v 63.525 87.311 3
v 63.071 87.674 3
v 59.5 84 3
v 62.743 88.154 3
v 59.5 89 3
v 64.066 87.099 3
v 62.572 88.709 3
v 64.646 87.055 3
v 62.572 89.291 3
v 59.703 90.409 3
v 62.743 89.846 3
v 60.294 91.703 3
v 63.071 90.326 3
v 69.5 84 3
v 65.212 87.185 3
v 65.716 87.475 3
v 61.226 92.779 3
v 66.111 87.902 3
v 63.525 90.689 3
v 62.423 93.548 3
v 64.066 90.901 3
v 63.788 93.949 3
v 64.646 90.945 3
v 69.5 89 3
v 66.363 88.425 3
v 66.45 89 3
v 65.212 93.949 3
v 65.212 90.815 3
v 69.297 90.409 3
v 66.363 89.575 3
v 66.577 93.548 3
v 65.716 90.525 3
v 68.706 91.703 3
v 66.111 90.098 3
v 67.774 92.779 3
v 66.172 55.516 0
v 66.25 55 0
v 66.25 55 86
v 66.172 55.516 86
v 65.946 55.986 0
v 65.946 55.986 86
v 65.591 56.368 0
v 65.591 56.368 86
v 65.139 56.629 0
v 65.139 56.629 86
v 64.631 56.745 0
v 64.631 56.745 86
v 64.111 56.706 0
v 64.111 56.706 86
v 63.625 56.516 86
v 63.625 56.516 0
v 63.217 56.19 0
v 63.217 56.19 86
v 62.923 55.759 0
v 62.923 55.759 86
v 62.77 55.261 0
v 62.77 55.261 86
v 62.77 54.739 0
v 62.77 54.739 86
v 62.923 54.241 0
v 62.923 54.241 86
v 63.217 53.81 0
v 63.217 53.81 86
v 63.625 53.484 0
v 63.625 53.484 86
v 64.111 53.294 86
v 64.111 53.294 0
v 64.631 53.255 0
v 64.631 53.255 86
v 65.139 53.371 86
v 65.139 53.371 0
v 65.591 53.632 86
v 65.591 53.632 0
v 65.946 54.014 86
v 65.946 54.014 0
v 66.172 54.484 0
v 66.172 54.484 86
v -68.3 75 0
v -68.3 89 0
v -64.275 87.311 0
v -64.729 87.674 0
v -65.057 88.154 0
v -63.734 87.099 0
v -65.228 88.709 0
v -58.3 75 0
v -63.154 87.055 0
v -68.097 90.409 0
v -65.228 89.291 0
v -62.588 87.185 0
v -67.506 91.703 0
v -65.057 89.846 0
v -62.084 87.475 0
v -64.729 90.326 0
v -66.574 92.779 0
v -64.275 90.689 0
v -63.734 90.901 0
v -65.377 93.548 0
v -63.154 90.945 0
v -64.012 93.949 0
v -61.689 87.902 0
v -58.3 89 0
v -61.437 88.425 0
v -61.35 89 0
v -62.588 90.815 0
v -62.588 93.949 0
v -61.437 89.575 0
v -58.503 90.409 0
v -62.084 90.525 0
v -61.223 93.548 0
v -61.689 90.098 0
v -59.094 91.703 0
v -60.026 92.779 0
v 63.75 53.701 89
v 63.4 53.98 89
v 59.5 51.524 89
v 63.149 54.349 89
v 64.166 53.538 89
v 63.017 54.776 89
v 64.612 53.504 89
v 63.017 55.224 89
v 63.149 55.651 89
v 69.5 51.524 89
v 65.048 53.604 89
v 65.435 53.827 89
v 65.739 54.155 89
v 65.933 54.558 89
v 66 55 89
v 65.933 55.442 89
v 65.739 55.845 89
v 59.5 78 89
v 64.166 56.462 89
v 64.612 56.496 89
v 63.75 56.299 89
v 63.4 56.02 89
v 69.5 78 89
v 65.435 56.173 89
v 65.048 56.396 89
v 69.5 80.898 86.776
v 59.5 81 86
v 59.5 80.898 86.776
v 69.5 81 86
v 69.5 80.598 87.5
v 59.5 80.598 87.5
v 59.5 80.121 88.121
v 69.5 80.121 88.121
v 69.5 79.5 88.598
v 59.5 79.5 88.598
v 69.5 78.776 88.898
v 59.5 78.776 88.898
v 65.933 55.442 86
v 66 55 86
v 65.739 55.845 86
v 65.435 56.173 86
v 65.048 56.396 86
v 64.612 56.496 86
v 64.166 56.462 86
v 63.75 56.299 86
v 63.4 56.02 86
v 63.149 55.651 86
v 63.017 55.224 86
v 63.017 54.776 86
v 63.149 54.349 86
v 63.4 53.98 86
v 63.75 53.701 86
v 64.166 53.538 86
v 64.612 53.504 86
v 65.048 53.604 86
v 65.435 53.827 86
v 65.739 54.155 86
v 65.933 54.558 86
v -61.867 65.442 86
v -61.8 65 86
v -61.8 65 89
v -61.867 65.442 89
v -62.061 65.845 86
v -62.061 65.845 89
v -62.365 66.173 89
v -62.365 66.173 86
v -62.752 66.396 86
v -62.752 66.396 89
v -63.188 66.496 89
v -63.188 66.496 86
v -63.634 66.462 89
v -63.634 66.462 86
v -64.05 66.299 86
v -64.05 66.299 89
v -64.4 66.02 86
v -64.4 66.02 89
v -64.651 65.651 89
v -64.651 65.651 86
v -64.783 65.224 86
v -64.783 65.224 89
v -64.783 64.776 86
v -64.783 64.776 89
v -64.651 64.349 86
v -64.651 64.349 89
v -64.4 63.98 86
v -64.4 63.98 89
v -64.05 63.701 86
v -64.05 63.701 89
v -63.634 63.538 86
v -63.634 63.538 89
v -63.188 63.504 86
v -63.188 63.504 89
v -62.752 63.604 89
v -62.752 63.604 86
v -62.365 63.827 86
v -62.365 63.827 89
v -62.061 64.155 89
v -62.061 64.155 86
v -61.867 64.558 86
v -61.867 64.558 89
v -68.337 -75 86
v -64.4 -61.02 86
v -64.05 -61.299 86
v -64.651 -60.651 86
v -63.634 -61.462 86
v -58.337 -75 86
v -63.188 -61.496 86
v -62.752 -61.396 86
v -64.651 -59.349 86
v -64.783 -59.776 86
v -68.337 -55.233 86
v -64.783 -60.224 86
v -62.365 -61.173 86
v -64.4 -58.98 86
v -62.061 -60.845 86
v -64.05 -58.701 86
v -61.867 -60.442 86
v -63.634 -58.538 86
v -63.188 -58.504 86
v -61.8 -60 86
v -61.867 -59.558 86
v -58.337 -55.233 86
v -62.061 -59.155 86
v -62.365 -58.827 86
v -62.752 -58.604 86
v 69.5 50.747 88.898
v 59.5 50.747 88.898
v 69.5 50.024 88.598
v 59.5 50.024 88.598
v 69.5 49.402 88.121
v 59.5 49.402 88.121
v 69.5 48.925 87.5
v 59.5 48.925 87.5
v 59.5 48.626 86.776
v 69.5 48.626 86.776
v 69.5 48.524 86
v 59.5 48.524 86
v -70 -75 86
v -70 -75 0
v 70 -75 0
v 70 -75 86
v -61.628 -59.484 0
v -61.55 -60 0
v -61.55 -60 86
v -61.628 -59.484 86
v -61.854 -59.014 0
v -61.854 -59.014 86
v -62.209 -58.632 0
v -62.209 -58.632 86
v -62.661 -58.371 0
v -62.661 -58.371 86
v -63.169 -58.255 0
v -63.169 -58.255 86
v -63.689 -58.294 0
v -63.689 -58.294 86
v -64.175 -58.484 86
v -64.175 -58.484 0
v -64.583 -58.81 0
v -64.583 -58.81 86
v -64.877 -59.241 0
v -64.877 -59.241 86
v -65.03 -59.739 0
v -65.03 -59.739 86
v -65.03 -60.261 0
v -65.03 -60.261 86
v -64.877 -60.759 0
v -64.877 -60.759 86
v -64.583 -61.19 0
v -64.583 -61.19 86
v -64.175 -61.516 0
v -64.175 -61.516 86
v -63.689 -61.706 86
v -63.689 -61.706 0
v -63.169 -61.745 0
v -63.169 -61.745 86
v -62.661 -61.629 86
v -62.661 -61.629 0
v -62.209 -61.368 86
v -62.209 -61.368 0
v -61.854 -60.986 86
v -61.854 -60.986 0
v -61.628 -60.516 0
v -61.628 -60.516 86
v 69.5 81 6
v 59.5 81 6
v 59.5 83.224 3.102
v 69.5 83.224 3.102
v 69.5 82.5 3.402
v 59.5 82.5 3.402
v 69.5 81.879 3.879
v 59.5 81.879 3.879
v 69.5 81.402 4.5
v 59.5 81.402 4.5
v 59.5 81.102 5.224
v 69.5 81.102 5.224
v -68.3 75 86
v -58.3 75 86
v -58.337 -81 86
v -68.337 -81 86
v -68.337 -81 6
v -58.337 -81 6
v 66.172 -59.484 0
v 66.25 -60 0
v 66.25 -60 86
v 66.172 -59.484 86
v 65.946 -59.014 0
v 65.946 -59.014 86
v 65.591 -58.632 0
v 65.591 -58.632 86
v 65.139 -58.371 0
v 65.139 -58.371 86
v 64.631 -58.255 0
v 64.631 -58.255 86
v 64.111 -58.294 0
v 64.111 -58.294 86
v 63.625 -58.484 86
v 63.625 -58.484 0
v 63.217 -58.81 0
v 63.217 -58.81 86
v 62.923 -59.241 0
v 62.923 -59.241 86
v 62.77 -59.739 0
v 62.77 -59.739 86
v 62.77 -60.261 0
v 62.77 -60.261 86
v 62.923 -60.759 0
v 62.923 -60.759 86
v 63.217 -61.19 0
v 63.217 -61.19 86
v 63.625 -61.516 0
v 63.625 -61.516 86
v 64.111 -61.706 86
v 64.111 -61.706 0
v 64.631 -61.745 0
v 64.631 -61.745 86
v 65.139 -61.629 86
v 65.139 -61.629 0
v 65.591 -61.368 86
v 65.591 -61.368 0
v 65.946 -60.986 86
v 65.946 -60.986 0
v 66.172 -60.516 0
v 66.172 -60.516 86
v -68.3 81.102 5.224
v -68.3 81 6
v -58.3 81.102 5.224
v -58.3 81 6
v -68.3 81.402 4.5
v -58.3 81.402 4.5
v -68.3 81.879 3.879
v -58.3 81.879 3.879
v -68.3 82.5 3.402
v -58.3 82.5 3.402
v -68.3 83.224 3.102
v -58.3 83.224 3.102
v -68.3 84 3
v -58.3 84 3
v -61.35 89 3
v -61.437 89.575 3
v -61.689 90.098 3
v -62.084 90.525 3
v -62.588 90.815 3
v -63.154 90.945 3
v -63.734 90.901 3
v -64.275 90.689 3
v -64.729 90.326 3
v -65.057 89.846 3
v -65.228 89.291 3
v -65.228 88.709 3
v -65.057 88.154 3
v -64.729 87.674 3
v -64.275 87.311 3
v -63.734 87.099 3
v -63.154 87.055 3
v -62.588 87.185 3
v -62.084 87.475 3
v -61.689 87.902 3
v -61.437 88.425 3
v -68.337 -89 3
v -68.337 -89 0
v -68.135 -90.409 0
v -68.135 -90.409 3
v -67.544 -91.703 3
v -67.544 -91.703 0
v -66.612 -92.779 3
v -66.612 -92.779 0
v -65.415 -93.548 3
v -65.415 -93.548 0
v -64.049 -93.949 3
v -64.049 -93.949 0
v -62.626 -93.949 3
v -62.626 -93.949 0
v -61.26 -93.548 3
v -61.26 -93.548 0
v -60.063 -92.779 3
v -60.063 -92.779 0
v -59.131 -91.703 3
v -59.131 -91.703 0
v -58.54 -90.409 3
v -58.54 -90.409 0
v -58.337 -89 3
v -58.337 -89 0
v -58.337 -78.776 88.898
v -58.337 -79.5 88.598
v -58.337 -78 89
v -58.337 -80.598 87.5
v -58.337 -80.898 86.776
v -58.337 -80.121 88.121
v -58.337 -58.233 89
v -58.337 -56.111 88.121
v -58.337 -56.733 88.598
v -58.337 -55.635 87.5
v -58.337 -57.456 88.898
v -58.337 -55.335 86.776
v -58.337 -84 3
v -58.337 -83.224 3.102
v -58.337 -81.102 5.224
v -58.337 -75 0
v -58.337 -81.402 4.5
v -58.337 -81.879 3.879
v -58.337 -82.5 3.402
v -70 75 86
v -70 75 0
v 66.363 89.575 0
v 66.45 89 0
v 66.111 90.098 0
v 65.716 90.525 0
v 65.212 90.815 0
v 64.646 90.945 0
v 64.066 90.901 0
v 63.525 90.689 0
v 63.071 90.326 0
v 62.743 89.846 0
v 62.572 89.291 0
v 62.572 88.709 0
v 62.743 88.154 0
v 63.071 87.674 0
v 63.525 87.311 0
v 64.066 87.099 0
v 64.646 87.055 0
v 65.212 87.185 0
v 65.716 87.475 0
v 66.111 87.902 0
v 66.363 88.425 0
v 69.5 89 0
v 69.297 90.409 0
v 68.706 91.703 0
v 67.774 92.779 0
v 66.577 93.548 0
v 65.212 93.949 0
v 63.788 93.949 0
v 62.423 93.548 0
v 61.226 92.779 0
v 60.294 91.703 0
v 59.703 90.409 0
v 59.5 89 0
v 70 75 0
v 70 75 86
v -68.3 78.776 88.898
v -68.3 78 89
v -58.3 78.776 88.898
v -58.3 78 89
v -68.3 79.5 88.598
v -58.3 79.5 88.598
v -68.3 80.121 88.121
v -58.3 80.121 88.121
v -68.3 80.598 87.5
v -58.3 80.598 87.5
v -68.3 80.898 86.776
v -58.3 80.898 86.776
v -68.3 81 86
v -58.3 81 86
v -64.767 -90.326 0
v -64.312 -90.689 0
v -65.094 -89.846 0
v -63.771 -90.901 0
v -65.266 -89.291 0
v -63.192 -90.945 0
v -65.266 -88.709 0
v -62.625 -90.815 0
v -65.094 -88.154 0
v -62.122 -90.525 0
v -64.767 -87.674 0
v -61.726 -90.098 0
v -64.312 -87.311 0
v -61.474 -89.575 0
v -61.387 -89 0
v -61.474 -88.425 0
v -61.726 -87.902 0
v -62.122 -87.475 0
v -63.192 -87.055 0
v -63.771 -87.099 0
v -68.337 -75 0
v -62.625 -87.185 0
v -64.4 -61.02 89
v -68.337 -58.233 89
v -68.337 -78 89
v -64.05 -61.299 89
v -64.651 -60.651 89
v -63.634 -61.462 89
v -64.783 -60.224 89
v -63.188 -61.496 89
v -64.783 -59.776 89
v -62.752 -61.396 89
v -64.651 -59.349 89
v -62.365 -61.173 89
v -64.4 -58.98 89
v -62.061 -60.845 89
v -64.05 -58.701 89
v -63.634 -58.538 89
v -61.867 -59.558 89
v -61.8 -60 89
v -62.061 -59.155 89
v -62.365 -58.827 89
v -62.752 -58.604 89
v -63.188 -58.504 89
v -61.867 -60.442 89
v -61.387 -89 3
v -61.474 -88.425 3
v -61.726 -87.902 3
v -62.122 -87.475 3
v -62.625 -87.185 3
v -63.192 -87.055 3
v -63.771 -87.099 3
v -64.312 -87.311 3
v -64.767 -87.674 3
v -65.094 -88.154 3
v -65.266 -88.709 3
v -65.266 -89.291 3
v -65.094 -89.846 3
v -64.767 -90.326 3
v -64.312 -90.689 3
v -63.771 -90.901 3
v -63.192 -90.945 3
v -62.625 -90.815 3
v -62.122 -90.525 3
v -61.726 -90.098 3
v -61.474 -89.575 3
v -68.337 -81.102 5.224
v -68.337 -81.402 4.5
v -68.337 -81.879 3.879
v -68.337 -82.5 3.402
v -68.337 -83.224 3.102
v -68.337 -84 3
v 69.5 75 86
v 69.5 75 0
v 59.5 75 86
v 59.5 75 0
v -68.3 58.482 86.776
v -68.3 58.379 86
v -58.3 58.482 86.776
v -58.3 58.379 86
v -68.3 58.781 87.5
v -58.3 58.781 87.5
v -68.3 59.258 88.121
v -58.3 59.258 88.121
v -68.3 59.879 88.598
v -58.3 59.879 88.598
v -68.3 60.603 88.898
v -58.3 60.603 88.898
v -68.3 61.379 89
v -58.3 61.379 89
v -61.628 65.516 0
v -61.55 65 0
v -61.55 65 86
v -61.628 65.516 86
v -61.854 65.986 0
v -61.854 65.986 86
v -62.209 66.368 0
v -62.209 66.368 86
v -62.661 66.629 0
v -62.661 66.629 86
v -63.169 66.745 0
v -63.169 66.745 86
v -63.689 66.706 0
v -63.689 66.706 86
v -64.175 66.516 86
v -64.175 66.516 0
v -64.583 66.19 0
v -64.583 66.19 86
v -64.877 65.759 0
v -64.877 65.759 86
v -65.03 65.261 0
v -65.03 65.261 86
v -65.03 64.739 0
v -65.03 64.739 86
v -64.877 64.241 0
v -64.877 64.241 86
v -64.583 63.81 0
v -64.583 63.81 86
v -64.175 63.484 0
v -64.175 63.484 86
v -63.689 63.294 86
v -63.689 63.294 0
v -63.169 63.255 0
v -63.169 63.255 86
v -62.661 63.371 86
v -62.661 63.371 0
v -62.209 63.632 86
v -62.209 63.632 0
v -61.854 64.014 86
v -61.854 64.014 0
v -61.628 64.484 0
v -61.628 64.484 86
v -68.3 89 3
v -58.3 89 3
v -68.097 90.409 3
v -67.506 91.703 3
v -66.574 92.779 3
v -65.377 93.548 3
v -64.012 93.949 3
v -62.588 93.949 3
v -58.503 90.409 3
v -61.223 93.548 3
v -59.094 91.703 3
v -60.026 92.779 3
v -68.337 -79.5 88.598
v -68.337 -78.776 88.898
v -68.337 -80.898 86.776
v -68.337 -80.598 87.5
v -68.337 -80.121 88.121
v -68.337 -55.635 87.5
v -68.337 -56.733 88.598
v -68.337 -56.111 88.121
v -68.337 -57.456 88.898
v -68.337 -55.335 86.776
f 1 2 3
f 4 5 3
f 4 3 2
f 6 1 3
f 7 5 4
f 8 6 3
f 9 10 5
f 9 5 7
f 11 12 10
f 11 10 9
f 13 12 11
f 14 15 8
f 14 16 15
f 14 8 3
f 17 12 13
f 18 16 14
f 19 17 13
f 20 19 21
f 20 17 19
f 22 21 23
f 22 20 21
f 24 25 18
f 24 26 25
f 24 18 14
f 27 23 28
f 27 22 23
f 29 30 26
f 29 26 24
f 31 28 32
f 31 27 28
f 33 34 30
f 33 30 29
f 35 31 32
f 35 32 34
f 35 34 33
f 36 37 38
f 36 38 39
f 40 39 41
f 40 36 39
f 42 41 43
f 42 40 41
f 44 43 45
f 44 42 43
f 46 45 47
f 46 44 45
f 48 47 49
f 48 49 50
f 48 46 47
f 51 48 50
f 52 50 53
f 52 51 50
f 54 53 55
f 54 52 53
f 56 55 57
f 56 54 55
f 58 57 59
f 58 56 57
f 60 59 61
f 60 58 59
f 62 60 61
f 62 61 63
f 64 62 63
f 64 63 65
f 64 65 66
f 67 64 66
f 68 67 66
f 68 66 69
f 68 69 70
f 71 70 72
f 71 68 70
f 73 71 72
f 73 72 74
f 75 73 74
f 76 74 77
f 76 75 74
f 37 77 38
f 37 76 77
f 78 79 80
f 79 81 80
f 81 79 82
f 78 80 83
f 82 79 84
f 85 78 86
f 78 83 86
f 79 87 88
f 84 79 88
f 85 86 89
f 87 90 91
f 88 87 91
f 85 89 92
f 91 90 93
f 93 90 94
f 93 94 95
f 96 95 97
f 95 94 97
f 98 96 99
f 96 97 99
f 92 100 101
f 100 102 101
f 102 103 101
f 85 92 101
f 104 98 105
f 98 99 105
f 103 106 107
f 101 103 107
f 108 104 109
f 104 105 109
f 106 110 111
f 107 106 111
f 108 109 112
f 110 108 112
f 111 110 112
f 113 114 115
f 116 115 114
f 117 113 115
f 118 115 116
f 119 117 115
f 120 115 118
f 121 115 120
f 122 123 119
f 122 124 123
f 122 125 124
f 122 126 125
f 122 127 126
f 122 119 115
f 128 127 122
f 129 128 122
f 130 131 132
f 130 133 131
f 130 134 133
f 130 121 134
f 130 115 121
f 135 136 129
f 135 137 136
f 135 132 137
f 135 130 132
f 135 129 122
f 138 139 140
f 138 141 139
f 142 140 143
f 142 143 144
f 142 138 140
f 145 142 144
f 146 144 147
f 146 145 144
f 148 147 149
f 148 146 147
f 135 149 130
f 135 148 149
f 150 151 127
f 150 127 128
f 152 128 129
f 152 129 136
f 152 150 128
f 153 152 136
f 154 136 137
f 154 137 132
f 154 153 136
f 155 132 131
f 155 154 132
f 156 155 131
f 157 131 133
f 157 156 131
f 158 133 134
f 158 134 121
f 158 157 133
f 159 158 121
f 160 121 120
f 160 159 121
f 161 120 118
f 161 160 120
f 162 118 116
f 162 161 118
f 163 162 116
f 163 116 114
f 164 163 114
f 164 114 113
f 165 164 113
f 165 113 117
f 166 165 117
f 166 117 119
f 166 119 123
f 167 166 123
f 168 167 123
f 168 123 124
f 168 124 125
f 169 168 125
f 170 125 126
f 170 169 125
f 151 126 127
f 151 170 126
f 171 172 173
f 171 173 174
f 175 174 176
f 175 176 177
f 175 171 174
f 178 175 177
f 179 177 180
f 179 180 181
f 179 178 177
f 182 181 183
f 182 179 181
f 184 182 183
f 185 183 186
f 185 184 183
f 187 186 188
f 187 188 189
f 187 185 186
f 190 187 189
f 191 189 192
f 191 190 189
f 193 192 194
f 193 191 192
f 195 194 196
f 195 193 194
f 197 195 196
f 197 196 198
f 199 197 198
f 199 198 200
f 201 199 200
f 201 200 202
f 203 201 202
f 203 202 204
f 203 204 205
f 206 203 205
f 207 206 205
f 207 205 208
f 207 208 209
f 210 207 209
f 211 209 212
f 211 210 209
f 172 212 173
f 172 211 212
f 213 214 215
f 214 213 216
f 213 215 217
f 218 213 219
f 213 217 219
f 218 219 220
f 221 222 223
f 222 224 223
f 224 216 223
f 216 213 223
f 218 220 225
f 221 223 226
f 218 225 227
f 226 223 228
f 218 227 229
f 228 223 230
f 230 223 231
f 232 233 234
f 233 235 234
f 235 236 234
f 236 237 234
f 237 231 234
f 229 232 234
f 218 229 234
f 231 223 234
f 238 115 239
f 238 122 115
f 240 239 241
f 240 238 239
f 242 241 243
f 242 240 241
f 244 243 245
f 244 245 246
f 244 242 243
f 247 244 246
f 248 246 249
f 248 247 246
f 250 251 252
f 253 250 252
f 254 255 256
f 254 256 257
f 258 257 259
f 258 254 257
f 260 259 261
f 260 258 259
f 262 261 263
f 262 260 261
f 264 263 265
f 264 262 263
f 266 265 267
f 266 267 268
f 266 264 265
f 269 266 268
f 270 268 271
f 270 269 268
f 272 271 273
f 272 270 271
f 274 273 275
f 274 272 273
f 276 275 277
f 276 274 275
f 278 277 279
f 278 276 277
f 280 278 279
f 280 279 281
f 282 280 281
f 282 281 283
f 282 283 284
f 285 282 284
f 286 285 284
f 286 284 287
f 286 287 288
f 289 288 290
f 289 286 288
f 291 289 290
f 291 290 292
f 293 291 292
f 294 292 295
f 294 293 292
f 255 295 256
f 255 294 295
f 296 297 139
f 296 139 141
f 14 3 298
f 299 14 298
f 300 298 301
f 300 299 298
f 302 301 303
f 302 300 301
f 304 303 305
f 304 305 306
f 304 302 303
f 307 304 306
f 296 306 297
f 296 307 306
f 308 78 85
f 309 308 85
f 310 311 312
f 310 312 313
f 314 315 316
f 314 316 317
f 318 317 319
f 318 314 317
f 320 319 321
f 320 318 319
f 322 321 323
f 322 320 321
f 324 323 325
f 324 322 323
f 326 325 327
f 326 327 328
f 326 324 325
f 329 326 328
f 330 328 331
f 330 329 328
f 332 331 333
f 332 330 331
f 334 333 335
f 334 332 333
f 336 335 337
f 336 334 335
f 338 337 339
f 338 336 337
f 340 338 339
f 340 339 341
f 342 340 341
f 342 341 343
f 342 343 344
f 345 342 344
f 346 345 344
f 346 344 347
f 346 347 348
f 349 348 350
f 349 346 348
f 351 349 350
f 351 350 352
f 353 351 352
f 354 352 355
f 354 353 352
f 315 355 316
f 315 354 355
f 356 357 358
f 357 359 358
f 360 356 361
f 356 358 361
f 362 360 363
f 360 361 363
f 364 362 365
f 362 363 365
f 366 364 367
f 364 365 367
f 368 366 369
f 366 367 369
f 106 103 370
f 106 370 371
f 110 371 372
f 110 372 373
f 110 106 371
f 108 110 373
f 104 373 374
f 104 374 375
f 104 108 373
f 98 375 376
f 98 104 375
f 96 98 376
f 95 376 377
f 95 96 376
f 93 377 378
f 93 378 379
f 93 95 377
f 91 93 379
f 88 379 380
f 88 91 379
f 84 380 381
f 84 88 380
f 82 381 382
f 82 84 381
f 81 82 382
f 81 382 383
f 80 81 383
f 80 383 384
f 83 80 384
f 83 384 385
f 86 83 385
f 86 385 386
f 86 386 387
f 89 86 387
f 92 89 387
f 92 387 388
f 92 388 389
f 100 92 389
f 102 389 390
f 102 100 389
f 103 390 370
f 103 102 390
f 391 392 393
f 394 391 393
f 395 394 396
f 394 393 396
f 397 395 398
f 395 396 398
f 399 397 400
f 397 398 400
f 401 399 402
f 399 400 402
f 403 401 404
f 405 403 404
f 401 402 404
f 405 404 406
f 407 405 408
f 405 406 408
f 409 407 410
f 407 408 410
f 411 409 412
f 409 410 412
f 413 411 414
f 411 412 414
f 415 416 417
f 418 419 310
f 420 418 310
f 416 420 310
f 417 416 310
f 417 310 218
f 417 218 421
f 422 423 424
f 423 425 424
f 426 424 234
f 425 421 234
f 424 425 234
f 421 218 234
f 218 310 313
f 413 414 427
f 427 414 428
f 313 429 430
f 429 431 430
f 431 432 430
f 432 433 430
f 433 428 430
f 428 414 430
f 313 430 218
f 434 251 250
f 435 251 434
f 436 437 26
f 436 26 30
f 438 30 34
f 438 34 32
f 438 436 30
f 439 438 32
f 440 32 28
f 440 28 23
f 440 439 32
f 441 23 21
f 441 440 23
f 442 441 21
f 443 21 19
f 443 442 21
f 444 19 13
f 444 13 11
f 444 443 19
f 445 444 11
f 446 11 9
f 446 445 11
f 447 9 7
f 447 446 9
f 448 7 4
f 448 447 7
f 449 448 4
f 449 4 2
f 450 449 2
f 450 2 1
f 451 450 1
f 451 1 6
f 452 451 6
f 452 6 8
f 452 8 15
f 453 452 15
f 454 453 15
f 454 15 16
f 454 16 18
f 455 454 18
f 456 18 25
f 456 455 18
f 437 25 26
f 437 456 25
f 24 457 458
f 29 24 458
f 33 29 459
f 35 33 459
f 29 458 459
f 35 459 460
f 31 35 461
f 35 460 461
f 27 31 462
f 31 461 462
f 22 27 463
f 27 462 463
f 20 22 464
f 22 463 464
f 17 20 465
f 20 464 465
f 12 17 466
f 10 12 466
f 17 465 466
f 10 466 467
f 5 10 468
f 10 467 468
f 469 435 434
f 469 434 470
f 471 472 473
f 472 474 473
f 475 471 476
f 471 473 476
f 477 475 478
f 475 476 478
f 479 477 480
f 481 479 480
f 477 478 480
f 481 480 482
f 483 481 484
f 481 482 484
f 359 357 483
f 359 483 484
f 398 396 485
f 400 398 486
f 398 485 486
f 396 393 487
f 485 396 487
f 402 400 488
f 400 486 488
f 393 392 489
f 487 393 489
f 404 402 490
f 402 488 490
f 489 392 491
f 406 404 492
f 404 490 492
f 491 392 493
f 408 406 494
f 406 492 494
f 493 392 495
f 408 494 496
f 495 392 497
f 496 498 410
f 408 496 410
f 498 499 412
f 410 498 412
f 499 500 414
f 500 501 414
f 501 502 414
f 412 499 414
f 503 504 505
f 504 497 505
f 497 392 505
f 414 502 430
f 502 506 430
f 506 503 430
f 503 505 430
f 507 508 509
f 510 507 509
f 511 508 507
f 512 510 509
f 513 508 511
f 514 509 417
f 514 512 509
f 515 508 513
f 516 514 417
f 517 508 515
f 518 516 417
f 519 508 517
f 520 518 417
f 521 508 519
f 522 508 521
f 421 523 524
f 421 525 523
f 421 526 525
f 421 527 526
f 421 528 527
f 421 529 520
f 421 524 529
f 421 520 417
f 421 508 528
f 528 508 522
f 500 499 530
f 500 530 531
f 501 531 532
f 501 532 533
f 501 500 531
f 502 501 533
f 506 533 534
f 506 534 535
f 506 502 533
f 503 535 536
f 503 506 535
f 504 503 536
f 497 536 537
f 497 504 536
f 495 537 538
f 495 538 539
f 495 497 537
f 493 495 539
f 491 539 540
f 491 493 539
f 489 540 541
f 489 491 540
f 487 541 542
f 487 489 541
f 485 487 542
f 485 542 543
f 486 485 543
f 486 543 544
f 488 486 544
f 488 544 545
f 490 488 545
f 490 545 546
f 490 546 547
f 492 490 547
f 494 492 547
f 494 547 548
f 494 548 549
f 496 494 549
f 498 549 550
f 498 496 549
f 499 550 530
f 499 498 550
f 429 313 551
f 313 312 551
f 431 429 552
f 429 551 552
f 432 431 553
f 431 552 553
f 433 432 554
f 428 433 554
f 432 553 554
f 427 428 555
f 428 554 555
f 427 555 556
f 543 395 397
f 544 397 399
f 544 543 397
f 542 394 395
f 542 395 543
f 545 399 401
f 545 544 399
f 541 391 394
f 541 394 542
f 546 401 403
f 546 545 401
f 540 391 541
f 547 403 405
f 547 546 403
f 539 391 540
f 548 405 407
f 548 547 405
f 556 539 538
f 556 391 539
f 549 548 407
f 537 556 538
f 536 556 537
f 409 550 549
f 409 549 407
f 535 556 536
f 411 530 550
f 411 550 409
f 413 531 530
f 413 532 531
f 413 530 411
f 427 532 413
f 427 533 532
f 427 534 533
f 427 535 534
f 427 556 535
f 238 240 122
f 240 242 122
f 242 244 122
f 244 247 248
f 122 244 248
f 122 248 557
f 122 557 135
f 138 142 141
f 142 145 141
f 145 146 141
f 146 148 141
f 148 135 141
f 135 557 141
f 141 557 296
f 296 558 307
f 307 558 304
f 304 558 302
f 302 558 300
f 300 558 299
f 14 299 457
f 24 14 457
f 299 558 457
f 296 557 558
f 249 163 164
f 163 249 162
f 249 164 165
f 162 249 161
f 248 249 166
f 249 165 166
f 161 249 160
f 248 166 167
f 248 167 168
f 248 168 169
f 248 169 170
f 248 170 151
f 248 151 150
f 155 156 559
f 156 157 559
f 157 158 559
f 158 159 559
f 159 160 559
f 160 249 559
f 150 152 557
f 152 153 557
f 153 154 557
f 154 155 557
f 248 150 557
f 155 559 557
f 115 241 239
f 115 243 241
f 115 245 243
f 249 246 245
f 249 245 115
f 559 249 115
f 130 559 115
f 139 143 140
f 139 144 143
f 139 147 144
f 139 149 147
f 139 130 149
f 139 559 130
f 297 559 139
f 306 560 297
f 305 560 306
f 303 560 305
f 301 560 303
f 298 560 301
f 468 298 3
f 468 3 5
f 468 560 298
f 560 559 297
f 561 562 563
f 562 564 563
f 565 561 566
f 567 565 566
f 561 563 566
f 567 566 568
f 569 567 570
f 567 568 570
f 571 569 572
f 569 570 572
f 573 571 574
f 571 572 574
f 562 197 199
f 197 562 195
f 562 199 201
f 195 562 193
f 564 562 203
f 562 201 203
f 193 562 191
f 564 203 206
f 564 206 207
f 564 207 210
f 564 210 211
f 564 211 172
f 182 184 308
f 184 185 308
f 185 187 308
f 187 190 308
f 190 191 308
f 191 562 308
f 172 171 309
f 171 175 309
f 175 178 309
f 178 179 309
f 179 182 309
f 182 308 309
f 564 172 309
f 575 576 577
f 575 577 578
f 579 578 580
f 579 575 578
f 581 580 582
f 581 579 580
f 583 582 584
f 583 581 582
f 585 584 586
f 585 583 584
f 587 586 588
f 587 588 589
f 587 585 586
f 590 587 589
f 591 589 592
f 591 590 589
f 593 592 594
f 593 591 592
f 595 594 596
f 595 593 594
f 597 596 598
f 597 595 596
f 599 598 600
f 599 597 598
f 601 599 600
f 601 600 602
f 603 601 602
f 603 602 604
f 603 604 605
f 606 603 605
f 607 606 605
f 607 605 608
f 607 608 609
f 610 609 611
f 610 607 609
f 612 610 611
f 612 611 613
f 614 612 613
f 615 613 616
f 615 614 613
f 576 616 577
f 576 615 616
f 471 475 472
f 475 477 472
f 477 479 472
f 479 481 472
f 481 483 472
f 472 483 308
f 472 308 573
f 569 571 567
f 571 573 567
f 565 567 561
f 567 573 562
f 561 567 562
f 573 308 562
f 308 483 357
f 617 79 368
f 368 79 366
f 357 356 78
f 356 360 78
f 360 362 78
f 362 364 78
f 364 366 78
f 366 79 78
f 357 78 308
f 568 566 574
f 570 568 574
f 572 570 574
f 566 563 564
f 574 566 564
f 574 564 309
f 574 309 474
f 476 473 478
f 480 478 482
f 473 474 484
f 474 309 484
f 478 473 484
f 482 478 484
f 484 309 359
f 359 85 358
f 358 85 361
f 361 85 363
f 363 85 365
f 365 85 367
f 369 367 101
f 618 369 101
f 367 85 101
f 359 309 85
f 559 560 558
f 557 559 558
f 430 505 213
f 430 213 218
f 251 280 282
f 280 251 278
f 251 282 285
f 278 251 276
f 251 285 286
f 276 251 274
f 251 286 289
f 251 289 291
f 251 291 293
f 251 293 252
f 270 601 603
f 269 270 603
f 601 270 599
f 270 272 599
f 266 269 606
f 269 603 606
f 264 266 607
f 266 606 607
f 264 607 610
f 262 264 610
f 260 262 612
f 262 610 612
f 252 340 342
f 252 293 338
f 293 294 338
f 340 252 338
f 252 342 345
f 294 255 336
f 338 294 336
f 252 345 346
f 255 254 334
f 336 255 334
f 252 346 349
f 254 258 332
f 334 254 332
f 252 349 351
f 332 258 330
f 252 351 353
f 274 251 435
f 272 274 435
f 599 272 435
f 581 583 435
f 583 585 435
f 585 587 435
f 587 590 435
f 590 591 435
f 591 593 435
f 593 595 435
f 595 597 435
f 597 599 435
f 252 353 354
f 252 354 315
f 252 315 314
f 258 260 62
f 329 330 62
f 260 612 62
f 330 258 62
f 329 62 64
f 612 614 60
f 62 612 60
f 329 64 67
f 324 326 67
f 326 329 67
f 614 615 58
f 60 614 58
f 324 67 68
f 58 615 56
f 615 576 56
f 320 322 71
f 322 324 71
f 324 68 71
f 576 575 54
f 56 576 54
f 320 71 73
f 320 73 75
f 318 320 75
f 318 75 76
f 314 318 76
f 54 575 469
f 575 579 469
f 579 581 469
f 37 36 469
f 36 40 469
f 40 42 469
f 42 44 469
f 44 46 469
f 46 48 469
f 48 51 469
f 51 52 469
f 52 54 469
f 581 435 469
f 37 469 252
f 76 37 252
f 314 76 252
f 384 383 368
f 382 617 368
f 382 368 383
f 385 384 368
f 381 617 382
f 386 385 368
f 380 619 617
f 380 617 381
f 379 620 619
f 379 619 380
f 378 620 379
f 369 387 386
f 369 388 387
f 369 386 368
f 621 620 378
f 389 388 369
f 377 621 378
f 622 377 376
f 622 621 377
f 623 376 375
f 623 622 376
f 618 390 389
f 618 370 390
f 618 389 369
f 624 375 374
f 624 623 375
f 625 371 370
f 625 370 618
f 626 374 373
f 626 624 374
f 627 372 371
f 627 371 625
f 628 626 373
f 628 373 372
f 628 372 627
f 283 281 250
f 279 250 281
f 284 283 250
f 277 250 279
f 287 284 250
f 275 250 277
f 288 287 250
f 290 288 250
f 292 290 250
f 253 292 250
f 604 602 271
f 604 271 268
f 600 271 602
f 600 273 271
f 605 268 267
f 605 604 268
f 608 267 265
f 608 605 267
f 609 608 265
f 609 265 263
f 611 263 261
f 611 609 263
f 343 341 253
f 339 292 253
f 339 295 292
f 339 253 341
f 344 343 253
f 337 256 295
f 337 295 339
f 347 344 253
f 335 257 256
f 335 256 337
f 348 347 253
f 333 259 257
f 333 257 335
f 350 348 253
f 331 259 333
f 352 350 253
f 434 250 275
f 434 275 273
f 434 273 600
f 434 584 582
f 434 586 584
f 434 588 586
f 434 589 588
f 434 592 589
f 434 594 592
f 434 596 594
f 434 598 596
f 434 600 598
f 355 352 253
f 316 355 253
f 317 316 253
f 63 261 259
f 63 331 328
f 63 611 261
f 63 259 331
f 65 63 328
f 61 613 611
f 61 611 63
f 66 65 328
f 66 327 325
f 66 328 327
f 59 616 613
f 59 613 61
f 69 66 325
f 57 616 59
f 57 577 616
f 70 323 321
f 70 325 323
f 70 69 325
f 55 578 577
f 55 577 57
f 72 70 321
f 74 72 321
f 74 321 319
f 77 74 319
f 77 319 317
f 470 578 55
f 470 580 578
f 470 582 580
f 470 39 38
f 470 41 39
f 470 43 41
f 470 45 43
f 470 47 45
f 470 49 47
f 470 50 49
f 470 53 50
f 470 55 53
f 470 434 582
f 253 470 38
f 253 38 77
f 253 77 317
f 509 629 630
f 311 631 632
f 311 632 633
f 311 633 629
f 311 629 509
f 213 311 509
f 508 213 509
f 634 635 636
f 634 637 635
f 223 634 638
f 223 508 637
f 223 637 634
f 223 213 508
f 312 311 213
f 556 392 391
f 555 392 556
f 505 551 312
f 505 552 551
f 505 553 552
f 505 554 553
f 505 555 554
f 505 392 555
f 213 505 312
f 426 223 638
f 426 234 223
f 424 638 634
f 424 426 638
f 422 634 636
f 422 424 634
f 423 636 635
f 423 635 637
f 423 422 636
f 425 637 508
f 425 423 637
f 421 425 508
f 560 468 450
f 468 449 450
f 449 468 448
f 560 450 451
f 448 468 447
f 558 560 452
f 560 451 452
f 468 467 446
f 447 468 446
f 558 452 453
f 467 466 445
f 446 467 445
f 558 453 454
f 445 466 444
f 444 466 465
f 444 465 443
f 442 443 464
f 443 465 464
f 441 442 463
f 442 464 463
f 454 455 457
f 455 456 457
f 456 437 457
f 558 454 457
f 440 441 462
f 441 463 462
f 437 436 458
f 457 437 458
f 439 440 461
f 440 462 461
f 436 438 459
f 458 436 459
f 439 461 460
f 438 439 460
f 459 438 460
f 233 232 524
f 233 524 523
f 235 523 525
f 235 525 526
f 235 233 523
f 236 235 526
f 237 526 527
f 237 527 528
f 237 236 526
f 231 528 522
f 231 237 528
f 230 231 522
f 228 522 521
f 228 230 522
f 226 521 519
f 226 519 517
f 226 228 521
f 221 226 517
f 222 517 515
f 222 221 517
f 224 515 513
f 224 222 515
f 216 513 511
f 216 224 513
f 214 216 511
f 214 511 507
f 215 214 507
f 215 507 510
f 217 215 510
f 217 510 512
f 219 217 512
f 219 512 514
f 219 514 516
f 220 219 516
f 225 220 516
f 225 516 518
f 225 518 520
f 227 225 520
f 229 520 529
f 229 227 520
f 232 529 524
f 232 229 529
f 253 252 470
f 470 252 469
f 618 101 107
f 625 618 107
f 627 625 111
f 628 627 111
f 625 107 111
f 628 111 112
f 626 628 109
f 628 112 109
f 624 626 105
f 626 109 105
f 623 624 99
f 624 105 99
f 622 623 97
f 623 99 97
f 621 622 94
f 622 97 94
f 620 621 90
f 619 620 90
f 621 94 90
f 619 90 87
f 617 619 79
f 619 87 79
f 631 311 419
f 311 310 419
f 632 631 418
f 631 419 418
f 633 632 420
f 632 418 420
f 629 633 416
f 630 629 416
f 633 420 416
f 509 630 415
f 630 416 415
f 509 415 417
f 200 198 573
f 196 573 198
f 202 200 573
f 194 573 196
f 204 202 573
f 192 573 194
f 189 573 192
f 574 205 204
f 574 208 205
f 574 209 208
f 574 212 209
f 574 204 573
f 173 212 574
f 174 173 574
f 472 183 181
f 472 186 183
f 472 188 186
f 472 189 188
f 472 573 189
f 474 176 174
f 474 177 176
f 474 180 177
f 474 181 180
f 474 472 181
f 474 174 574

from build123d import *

# Parameters (mm, degrees)
F0_W      = 140
F0_H      = 150
F0_R      = 1.75
F1_DEPTH  = 86
F2_R      = 1.95
F3_DEPTH  = 3
F2_W      = 10
F2_H      = 6
F4_DEPTH  = 86
F5_W      = 10
F5_H      = 16.6205504089
F5_R      = 1.5
F5_H_2    = 6
F6_DEPTH  = 3
F7_R      = 1.95
F8_DEPTH  = 3
F7_W      = 10
F7_H      = 6
F9_DEPTH  = 86
F10_W     = 10
F10_H     = 32.4764741033
F10_R     = 1.5
F11_DEPTH = 3
F12_W     = 10
F12_H     = 6
F13_DEPTH = 86
F12_R     = 1.95
F14_DEPTH = 3
F15_W     = 10
F15_H     = 25.7673753845
F15_R     = 1.5
F16_DEPTH = 3
F17_R     = 2.99999
F17_2_R   = 2.99999
F17_3_R   = 2.99999


# Not quite as in the source:
# - a fillet or chamfer is up to 0.001 mm smaller than in the source, because OpenCascade refuses the exact size


with BuildPart() as f1:
    # F0 (on Top) → F1 (new body)
    with BuildSketch(Plane.XY):
        Rectangle(F0_W, F0_H)
        with Locations((-63.3, -60)):
            Circle(F0_R, mode=Mode.SUBTRACT)
        with Locations((64.5, -60)):
            Circle(F0_R, mode=Mode.SUBTRACT)
        with Locations((-63.3, 65)):
            Circle(F0_R, mode=Mode.SUBTRACT)
        with Locations((64.5, 55)):
            Circle(F0_R, mode=Mode.SUBTRACT)
    extrude(amount=F1_DEPTH)


with BuildPart() as f3:
    # F2 (on Top) → F3 (new body)
    with BuildSketch(Plane.XY):
        with BuildLine():
            ThreePointArc((-68.3, 89), (-63.3, 84), (-58.3, 89))
            ThreePointArc((-58.3, 89), (-63.3, 94), (-68.3, 89))
        make_face()
        with Locations((-63.3, 89)):
            Circle(F2_R, mode=Mode.SUBTRACT)
        with BuildLine():
            Line((-58.3, 81), (-58.3, 89))
            ThreePointArc((-58.3, 89), (-63.3, 84), (-68.3, 89))
            Line((-68.3, 89), (-68.3, 81))
            Line((-68.3, 81), (-58.3, 81))
        make_face()
    extrude(amount=F3_DEPTH)

    # F2 (on Top) → F4 (join)
    with BuildSketch(Plane.XY):
        with Locations((-63.3, 78)):
            Rectangle(F2_W, F2_H)
    extrude(amount=F4_DEPTH)

    # F5 (on face) → F6 (join)
    with BuildSketch(Plane.XY.offset(86)):
        with Locations((-63.3, 66.6897247956)):
            Rectangle(F5_W, F5_H)
        with Locations((-63.3, 65)):
            Circle(F5_R, mode=Mode.SUBTRACT)
        with Locations((-63.3, 78)):
            Rectangle(F5_W, F5_H_2)
    extrude(amount=F6_DEPTH)

    # F17 (radius 3 in the source; OpenCascade refuses exactly that, so slightly less here)
    f17_edges = [f3.edges().sort_by_distance(p)[0] for p in [
        (-63.3, 81, 89),
        (-63.3, 81, 3),
        (-63.3, 58.37945, 89),
    ]]
    fillet(f17_edges, radius=F17_R)


with BuildPart() as f8:
    # F7 (on Top) → F8 (new body)
    with BuildSketch(Plane.XY):
        with BuildLine():
            ThreePointArc((59.5, 89), (64.5, 84), (69.5, 89))
            ThreePointArc((69.5, 89), (64.5, 94), (59.5, 89))
        make_face()
        with Locations((64.5, 89)):
            Circle(F7_R, mode=Mode.SUBTRACT)
        with BuildLine():
            Line((69.5, 81), (69.5, 89))
            ThreePointArc((69.5, 89), (64.5, 84), (59.5, 89))
            Line((59.5, 89), (59.5, 81))
            Line((59.5, 81), (69.5, 81))
        make_face()
    extrude(amount=F8_DEPTH)

    # F7 (on Top) → F9 (join)
    with BuildSketch(Plane.XY):
        with Locations((64.5, 78)):
            Rectangle(F7_W, F7_H)
    extrude(amount=F9_DEPTH)

    # F10 (on face) → F11 (join)
    with BuildSketch(Plane.XY.offset(86)):
        with Locations((64.5, 64.7617629484)):
            Rectangle(F10_W, F10_H)
        with Locations((64.5, 55)):
            Circle(F10_R, mode=Mode.SUBTRACT)
    extrude(amount=F11_DEPTH)

    # F17#2 (radius 3 in the source; OpenCascade refuses exactly that, so slightly less here)
    f17_2_edges = [f8.edges().sort_by_distance(p)[0] for p in [
        (64.5, 81, 89),
        (64.5, 81, 3),
        (64.5, 48.523526, 89),
    ]]
    fillet(f17_2_edges, radius=F17_2_R)


with BuildPart() as f13:
    # F12 (on Top) → F13 (new body)
    with BuildSketch(Plane.XY):
        with Locations((-63.3374598043, -78)):
            Rectangle(F12_W, F12_H)
    extrude(amount=F13_DEPTH)

    # F12 (on Top) → F14 (join)
    with BuildSketch(Plane.XY):
        with BuildLine():
            ThreePointArc((-68.3374598043, -89), (-63.3374598043, -84), (-58.3374598043, -89))
            Line((-58.3374598043, -89), (-58.3374598043, -81))
            Line((-58.3374598043, -81), (-68.3374598043, -81))
            Line((-68.3374598043, -81), (-68.3374598043, -89))
        make_face()
        with BuildLine():
            ThreePointArc((-68.3374598043, -89), (-63.3374598043, -94), (-58.3374598043, -89))
            ThreePointArc((-58.3374598043, -89), (-63.3374598043, -84), (-68.3374598043, -89))
        make_face()
        with Locations((-63.3374598043, -89)):
            Circle(F12_R, mode=Mode.SUBTRACT)
    extrude(amount=F14_DEPTH)

    # F15 (on face) → F16 (join)
    with BuildSketch(Plane.XY.offset(86)):
        with Locations((-63.3374598043, -68.1163123077)):
            Rectangle(F15_W, F15_H)
        with Locations((-63.3, -60)):
            Circle(F15_R, mode=Mode.SUBTRACT)
    extrude(amount=F16_DEPTH)

    # F17#3 (radius 3 in the source; OpenCascade refuses exactly that, so slightly less here)
    f17_3_edges = [f13.edges().sort_by_distance(p)[0] for p in [
        (-63.33746, -81, 89),
        (-63.33746, -55.232625, 89),
        (-63.33746, -81, 3),
    ]]
    fillet(f17_3_edges, radius=F17_3_R)


solid = Compound([f1.part, f3.part, f8.part, f13.part])
